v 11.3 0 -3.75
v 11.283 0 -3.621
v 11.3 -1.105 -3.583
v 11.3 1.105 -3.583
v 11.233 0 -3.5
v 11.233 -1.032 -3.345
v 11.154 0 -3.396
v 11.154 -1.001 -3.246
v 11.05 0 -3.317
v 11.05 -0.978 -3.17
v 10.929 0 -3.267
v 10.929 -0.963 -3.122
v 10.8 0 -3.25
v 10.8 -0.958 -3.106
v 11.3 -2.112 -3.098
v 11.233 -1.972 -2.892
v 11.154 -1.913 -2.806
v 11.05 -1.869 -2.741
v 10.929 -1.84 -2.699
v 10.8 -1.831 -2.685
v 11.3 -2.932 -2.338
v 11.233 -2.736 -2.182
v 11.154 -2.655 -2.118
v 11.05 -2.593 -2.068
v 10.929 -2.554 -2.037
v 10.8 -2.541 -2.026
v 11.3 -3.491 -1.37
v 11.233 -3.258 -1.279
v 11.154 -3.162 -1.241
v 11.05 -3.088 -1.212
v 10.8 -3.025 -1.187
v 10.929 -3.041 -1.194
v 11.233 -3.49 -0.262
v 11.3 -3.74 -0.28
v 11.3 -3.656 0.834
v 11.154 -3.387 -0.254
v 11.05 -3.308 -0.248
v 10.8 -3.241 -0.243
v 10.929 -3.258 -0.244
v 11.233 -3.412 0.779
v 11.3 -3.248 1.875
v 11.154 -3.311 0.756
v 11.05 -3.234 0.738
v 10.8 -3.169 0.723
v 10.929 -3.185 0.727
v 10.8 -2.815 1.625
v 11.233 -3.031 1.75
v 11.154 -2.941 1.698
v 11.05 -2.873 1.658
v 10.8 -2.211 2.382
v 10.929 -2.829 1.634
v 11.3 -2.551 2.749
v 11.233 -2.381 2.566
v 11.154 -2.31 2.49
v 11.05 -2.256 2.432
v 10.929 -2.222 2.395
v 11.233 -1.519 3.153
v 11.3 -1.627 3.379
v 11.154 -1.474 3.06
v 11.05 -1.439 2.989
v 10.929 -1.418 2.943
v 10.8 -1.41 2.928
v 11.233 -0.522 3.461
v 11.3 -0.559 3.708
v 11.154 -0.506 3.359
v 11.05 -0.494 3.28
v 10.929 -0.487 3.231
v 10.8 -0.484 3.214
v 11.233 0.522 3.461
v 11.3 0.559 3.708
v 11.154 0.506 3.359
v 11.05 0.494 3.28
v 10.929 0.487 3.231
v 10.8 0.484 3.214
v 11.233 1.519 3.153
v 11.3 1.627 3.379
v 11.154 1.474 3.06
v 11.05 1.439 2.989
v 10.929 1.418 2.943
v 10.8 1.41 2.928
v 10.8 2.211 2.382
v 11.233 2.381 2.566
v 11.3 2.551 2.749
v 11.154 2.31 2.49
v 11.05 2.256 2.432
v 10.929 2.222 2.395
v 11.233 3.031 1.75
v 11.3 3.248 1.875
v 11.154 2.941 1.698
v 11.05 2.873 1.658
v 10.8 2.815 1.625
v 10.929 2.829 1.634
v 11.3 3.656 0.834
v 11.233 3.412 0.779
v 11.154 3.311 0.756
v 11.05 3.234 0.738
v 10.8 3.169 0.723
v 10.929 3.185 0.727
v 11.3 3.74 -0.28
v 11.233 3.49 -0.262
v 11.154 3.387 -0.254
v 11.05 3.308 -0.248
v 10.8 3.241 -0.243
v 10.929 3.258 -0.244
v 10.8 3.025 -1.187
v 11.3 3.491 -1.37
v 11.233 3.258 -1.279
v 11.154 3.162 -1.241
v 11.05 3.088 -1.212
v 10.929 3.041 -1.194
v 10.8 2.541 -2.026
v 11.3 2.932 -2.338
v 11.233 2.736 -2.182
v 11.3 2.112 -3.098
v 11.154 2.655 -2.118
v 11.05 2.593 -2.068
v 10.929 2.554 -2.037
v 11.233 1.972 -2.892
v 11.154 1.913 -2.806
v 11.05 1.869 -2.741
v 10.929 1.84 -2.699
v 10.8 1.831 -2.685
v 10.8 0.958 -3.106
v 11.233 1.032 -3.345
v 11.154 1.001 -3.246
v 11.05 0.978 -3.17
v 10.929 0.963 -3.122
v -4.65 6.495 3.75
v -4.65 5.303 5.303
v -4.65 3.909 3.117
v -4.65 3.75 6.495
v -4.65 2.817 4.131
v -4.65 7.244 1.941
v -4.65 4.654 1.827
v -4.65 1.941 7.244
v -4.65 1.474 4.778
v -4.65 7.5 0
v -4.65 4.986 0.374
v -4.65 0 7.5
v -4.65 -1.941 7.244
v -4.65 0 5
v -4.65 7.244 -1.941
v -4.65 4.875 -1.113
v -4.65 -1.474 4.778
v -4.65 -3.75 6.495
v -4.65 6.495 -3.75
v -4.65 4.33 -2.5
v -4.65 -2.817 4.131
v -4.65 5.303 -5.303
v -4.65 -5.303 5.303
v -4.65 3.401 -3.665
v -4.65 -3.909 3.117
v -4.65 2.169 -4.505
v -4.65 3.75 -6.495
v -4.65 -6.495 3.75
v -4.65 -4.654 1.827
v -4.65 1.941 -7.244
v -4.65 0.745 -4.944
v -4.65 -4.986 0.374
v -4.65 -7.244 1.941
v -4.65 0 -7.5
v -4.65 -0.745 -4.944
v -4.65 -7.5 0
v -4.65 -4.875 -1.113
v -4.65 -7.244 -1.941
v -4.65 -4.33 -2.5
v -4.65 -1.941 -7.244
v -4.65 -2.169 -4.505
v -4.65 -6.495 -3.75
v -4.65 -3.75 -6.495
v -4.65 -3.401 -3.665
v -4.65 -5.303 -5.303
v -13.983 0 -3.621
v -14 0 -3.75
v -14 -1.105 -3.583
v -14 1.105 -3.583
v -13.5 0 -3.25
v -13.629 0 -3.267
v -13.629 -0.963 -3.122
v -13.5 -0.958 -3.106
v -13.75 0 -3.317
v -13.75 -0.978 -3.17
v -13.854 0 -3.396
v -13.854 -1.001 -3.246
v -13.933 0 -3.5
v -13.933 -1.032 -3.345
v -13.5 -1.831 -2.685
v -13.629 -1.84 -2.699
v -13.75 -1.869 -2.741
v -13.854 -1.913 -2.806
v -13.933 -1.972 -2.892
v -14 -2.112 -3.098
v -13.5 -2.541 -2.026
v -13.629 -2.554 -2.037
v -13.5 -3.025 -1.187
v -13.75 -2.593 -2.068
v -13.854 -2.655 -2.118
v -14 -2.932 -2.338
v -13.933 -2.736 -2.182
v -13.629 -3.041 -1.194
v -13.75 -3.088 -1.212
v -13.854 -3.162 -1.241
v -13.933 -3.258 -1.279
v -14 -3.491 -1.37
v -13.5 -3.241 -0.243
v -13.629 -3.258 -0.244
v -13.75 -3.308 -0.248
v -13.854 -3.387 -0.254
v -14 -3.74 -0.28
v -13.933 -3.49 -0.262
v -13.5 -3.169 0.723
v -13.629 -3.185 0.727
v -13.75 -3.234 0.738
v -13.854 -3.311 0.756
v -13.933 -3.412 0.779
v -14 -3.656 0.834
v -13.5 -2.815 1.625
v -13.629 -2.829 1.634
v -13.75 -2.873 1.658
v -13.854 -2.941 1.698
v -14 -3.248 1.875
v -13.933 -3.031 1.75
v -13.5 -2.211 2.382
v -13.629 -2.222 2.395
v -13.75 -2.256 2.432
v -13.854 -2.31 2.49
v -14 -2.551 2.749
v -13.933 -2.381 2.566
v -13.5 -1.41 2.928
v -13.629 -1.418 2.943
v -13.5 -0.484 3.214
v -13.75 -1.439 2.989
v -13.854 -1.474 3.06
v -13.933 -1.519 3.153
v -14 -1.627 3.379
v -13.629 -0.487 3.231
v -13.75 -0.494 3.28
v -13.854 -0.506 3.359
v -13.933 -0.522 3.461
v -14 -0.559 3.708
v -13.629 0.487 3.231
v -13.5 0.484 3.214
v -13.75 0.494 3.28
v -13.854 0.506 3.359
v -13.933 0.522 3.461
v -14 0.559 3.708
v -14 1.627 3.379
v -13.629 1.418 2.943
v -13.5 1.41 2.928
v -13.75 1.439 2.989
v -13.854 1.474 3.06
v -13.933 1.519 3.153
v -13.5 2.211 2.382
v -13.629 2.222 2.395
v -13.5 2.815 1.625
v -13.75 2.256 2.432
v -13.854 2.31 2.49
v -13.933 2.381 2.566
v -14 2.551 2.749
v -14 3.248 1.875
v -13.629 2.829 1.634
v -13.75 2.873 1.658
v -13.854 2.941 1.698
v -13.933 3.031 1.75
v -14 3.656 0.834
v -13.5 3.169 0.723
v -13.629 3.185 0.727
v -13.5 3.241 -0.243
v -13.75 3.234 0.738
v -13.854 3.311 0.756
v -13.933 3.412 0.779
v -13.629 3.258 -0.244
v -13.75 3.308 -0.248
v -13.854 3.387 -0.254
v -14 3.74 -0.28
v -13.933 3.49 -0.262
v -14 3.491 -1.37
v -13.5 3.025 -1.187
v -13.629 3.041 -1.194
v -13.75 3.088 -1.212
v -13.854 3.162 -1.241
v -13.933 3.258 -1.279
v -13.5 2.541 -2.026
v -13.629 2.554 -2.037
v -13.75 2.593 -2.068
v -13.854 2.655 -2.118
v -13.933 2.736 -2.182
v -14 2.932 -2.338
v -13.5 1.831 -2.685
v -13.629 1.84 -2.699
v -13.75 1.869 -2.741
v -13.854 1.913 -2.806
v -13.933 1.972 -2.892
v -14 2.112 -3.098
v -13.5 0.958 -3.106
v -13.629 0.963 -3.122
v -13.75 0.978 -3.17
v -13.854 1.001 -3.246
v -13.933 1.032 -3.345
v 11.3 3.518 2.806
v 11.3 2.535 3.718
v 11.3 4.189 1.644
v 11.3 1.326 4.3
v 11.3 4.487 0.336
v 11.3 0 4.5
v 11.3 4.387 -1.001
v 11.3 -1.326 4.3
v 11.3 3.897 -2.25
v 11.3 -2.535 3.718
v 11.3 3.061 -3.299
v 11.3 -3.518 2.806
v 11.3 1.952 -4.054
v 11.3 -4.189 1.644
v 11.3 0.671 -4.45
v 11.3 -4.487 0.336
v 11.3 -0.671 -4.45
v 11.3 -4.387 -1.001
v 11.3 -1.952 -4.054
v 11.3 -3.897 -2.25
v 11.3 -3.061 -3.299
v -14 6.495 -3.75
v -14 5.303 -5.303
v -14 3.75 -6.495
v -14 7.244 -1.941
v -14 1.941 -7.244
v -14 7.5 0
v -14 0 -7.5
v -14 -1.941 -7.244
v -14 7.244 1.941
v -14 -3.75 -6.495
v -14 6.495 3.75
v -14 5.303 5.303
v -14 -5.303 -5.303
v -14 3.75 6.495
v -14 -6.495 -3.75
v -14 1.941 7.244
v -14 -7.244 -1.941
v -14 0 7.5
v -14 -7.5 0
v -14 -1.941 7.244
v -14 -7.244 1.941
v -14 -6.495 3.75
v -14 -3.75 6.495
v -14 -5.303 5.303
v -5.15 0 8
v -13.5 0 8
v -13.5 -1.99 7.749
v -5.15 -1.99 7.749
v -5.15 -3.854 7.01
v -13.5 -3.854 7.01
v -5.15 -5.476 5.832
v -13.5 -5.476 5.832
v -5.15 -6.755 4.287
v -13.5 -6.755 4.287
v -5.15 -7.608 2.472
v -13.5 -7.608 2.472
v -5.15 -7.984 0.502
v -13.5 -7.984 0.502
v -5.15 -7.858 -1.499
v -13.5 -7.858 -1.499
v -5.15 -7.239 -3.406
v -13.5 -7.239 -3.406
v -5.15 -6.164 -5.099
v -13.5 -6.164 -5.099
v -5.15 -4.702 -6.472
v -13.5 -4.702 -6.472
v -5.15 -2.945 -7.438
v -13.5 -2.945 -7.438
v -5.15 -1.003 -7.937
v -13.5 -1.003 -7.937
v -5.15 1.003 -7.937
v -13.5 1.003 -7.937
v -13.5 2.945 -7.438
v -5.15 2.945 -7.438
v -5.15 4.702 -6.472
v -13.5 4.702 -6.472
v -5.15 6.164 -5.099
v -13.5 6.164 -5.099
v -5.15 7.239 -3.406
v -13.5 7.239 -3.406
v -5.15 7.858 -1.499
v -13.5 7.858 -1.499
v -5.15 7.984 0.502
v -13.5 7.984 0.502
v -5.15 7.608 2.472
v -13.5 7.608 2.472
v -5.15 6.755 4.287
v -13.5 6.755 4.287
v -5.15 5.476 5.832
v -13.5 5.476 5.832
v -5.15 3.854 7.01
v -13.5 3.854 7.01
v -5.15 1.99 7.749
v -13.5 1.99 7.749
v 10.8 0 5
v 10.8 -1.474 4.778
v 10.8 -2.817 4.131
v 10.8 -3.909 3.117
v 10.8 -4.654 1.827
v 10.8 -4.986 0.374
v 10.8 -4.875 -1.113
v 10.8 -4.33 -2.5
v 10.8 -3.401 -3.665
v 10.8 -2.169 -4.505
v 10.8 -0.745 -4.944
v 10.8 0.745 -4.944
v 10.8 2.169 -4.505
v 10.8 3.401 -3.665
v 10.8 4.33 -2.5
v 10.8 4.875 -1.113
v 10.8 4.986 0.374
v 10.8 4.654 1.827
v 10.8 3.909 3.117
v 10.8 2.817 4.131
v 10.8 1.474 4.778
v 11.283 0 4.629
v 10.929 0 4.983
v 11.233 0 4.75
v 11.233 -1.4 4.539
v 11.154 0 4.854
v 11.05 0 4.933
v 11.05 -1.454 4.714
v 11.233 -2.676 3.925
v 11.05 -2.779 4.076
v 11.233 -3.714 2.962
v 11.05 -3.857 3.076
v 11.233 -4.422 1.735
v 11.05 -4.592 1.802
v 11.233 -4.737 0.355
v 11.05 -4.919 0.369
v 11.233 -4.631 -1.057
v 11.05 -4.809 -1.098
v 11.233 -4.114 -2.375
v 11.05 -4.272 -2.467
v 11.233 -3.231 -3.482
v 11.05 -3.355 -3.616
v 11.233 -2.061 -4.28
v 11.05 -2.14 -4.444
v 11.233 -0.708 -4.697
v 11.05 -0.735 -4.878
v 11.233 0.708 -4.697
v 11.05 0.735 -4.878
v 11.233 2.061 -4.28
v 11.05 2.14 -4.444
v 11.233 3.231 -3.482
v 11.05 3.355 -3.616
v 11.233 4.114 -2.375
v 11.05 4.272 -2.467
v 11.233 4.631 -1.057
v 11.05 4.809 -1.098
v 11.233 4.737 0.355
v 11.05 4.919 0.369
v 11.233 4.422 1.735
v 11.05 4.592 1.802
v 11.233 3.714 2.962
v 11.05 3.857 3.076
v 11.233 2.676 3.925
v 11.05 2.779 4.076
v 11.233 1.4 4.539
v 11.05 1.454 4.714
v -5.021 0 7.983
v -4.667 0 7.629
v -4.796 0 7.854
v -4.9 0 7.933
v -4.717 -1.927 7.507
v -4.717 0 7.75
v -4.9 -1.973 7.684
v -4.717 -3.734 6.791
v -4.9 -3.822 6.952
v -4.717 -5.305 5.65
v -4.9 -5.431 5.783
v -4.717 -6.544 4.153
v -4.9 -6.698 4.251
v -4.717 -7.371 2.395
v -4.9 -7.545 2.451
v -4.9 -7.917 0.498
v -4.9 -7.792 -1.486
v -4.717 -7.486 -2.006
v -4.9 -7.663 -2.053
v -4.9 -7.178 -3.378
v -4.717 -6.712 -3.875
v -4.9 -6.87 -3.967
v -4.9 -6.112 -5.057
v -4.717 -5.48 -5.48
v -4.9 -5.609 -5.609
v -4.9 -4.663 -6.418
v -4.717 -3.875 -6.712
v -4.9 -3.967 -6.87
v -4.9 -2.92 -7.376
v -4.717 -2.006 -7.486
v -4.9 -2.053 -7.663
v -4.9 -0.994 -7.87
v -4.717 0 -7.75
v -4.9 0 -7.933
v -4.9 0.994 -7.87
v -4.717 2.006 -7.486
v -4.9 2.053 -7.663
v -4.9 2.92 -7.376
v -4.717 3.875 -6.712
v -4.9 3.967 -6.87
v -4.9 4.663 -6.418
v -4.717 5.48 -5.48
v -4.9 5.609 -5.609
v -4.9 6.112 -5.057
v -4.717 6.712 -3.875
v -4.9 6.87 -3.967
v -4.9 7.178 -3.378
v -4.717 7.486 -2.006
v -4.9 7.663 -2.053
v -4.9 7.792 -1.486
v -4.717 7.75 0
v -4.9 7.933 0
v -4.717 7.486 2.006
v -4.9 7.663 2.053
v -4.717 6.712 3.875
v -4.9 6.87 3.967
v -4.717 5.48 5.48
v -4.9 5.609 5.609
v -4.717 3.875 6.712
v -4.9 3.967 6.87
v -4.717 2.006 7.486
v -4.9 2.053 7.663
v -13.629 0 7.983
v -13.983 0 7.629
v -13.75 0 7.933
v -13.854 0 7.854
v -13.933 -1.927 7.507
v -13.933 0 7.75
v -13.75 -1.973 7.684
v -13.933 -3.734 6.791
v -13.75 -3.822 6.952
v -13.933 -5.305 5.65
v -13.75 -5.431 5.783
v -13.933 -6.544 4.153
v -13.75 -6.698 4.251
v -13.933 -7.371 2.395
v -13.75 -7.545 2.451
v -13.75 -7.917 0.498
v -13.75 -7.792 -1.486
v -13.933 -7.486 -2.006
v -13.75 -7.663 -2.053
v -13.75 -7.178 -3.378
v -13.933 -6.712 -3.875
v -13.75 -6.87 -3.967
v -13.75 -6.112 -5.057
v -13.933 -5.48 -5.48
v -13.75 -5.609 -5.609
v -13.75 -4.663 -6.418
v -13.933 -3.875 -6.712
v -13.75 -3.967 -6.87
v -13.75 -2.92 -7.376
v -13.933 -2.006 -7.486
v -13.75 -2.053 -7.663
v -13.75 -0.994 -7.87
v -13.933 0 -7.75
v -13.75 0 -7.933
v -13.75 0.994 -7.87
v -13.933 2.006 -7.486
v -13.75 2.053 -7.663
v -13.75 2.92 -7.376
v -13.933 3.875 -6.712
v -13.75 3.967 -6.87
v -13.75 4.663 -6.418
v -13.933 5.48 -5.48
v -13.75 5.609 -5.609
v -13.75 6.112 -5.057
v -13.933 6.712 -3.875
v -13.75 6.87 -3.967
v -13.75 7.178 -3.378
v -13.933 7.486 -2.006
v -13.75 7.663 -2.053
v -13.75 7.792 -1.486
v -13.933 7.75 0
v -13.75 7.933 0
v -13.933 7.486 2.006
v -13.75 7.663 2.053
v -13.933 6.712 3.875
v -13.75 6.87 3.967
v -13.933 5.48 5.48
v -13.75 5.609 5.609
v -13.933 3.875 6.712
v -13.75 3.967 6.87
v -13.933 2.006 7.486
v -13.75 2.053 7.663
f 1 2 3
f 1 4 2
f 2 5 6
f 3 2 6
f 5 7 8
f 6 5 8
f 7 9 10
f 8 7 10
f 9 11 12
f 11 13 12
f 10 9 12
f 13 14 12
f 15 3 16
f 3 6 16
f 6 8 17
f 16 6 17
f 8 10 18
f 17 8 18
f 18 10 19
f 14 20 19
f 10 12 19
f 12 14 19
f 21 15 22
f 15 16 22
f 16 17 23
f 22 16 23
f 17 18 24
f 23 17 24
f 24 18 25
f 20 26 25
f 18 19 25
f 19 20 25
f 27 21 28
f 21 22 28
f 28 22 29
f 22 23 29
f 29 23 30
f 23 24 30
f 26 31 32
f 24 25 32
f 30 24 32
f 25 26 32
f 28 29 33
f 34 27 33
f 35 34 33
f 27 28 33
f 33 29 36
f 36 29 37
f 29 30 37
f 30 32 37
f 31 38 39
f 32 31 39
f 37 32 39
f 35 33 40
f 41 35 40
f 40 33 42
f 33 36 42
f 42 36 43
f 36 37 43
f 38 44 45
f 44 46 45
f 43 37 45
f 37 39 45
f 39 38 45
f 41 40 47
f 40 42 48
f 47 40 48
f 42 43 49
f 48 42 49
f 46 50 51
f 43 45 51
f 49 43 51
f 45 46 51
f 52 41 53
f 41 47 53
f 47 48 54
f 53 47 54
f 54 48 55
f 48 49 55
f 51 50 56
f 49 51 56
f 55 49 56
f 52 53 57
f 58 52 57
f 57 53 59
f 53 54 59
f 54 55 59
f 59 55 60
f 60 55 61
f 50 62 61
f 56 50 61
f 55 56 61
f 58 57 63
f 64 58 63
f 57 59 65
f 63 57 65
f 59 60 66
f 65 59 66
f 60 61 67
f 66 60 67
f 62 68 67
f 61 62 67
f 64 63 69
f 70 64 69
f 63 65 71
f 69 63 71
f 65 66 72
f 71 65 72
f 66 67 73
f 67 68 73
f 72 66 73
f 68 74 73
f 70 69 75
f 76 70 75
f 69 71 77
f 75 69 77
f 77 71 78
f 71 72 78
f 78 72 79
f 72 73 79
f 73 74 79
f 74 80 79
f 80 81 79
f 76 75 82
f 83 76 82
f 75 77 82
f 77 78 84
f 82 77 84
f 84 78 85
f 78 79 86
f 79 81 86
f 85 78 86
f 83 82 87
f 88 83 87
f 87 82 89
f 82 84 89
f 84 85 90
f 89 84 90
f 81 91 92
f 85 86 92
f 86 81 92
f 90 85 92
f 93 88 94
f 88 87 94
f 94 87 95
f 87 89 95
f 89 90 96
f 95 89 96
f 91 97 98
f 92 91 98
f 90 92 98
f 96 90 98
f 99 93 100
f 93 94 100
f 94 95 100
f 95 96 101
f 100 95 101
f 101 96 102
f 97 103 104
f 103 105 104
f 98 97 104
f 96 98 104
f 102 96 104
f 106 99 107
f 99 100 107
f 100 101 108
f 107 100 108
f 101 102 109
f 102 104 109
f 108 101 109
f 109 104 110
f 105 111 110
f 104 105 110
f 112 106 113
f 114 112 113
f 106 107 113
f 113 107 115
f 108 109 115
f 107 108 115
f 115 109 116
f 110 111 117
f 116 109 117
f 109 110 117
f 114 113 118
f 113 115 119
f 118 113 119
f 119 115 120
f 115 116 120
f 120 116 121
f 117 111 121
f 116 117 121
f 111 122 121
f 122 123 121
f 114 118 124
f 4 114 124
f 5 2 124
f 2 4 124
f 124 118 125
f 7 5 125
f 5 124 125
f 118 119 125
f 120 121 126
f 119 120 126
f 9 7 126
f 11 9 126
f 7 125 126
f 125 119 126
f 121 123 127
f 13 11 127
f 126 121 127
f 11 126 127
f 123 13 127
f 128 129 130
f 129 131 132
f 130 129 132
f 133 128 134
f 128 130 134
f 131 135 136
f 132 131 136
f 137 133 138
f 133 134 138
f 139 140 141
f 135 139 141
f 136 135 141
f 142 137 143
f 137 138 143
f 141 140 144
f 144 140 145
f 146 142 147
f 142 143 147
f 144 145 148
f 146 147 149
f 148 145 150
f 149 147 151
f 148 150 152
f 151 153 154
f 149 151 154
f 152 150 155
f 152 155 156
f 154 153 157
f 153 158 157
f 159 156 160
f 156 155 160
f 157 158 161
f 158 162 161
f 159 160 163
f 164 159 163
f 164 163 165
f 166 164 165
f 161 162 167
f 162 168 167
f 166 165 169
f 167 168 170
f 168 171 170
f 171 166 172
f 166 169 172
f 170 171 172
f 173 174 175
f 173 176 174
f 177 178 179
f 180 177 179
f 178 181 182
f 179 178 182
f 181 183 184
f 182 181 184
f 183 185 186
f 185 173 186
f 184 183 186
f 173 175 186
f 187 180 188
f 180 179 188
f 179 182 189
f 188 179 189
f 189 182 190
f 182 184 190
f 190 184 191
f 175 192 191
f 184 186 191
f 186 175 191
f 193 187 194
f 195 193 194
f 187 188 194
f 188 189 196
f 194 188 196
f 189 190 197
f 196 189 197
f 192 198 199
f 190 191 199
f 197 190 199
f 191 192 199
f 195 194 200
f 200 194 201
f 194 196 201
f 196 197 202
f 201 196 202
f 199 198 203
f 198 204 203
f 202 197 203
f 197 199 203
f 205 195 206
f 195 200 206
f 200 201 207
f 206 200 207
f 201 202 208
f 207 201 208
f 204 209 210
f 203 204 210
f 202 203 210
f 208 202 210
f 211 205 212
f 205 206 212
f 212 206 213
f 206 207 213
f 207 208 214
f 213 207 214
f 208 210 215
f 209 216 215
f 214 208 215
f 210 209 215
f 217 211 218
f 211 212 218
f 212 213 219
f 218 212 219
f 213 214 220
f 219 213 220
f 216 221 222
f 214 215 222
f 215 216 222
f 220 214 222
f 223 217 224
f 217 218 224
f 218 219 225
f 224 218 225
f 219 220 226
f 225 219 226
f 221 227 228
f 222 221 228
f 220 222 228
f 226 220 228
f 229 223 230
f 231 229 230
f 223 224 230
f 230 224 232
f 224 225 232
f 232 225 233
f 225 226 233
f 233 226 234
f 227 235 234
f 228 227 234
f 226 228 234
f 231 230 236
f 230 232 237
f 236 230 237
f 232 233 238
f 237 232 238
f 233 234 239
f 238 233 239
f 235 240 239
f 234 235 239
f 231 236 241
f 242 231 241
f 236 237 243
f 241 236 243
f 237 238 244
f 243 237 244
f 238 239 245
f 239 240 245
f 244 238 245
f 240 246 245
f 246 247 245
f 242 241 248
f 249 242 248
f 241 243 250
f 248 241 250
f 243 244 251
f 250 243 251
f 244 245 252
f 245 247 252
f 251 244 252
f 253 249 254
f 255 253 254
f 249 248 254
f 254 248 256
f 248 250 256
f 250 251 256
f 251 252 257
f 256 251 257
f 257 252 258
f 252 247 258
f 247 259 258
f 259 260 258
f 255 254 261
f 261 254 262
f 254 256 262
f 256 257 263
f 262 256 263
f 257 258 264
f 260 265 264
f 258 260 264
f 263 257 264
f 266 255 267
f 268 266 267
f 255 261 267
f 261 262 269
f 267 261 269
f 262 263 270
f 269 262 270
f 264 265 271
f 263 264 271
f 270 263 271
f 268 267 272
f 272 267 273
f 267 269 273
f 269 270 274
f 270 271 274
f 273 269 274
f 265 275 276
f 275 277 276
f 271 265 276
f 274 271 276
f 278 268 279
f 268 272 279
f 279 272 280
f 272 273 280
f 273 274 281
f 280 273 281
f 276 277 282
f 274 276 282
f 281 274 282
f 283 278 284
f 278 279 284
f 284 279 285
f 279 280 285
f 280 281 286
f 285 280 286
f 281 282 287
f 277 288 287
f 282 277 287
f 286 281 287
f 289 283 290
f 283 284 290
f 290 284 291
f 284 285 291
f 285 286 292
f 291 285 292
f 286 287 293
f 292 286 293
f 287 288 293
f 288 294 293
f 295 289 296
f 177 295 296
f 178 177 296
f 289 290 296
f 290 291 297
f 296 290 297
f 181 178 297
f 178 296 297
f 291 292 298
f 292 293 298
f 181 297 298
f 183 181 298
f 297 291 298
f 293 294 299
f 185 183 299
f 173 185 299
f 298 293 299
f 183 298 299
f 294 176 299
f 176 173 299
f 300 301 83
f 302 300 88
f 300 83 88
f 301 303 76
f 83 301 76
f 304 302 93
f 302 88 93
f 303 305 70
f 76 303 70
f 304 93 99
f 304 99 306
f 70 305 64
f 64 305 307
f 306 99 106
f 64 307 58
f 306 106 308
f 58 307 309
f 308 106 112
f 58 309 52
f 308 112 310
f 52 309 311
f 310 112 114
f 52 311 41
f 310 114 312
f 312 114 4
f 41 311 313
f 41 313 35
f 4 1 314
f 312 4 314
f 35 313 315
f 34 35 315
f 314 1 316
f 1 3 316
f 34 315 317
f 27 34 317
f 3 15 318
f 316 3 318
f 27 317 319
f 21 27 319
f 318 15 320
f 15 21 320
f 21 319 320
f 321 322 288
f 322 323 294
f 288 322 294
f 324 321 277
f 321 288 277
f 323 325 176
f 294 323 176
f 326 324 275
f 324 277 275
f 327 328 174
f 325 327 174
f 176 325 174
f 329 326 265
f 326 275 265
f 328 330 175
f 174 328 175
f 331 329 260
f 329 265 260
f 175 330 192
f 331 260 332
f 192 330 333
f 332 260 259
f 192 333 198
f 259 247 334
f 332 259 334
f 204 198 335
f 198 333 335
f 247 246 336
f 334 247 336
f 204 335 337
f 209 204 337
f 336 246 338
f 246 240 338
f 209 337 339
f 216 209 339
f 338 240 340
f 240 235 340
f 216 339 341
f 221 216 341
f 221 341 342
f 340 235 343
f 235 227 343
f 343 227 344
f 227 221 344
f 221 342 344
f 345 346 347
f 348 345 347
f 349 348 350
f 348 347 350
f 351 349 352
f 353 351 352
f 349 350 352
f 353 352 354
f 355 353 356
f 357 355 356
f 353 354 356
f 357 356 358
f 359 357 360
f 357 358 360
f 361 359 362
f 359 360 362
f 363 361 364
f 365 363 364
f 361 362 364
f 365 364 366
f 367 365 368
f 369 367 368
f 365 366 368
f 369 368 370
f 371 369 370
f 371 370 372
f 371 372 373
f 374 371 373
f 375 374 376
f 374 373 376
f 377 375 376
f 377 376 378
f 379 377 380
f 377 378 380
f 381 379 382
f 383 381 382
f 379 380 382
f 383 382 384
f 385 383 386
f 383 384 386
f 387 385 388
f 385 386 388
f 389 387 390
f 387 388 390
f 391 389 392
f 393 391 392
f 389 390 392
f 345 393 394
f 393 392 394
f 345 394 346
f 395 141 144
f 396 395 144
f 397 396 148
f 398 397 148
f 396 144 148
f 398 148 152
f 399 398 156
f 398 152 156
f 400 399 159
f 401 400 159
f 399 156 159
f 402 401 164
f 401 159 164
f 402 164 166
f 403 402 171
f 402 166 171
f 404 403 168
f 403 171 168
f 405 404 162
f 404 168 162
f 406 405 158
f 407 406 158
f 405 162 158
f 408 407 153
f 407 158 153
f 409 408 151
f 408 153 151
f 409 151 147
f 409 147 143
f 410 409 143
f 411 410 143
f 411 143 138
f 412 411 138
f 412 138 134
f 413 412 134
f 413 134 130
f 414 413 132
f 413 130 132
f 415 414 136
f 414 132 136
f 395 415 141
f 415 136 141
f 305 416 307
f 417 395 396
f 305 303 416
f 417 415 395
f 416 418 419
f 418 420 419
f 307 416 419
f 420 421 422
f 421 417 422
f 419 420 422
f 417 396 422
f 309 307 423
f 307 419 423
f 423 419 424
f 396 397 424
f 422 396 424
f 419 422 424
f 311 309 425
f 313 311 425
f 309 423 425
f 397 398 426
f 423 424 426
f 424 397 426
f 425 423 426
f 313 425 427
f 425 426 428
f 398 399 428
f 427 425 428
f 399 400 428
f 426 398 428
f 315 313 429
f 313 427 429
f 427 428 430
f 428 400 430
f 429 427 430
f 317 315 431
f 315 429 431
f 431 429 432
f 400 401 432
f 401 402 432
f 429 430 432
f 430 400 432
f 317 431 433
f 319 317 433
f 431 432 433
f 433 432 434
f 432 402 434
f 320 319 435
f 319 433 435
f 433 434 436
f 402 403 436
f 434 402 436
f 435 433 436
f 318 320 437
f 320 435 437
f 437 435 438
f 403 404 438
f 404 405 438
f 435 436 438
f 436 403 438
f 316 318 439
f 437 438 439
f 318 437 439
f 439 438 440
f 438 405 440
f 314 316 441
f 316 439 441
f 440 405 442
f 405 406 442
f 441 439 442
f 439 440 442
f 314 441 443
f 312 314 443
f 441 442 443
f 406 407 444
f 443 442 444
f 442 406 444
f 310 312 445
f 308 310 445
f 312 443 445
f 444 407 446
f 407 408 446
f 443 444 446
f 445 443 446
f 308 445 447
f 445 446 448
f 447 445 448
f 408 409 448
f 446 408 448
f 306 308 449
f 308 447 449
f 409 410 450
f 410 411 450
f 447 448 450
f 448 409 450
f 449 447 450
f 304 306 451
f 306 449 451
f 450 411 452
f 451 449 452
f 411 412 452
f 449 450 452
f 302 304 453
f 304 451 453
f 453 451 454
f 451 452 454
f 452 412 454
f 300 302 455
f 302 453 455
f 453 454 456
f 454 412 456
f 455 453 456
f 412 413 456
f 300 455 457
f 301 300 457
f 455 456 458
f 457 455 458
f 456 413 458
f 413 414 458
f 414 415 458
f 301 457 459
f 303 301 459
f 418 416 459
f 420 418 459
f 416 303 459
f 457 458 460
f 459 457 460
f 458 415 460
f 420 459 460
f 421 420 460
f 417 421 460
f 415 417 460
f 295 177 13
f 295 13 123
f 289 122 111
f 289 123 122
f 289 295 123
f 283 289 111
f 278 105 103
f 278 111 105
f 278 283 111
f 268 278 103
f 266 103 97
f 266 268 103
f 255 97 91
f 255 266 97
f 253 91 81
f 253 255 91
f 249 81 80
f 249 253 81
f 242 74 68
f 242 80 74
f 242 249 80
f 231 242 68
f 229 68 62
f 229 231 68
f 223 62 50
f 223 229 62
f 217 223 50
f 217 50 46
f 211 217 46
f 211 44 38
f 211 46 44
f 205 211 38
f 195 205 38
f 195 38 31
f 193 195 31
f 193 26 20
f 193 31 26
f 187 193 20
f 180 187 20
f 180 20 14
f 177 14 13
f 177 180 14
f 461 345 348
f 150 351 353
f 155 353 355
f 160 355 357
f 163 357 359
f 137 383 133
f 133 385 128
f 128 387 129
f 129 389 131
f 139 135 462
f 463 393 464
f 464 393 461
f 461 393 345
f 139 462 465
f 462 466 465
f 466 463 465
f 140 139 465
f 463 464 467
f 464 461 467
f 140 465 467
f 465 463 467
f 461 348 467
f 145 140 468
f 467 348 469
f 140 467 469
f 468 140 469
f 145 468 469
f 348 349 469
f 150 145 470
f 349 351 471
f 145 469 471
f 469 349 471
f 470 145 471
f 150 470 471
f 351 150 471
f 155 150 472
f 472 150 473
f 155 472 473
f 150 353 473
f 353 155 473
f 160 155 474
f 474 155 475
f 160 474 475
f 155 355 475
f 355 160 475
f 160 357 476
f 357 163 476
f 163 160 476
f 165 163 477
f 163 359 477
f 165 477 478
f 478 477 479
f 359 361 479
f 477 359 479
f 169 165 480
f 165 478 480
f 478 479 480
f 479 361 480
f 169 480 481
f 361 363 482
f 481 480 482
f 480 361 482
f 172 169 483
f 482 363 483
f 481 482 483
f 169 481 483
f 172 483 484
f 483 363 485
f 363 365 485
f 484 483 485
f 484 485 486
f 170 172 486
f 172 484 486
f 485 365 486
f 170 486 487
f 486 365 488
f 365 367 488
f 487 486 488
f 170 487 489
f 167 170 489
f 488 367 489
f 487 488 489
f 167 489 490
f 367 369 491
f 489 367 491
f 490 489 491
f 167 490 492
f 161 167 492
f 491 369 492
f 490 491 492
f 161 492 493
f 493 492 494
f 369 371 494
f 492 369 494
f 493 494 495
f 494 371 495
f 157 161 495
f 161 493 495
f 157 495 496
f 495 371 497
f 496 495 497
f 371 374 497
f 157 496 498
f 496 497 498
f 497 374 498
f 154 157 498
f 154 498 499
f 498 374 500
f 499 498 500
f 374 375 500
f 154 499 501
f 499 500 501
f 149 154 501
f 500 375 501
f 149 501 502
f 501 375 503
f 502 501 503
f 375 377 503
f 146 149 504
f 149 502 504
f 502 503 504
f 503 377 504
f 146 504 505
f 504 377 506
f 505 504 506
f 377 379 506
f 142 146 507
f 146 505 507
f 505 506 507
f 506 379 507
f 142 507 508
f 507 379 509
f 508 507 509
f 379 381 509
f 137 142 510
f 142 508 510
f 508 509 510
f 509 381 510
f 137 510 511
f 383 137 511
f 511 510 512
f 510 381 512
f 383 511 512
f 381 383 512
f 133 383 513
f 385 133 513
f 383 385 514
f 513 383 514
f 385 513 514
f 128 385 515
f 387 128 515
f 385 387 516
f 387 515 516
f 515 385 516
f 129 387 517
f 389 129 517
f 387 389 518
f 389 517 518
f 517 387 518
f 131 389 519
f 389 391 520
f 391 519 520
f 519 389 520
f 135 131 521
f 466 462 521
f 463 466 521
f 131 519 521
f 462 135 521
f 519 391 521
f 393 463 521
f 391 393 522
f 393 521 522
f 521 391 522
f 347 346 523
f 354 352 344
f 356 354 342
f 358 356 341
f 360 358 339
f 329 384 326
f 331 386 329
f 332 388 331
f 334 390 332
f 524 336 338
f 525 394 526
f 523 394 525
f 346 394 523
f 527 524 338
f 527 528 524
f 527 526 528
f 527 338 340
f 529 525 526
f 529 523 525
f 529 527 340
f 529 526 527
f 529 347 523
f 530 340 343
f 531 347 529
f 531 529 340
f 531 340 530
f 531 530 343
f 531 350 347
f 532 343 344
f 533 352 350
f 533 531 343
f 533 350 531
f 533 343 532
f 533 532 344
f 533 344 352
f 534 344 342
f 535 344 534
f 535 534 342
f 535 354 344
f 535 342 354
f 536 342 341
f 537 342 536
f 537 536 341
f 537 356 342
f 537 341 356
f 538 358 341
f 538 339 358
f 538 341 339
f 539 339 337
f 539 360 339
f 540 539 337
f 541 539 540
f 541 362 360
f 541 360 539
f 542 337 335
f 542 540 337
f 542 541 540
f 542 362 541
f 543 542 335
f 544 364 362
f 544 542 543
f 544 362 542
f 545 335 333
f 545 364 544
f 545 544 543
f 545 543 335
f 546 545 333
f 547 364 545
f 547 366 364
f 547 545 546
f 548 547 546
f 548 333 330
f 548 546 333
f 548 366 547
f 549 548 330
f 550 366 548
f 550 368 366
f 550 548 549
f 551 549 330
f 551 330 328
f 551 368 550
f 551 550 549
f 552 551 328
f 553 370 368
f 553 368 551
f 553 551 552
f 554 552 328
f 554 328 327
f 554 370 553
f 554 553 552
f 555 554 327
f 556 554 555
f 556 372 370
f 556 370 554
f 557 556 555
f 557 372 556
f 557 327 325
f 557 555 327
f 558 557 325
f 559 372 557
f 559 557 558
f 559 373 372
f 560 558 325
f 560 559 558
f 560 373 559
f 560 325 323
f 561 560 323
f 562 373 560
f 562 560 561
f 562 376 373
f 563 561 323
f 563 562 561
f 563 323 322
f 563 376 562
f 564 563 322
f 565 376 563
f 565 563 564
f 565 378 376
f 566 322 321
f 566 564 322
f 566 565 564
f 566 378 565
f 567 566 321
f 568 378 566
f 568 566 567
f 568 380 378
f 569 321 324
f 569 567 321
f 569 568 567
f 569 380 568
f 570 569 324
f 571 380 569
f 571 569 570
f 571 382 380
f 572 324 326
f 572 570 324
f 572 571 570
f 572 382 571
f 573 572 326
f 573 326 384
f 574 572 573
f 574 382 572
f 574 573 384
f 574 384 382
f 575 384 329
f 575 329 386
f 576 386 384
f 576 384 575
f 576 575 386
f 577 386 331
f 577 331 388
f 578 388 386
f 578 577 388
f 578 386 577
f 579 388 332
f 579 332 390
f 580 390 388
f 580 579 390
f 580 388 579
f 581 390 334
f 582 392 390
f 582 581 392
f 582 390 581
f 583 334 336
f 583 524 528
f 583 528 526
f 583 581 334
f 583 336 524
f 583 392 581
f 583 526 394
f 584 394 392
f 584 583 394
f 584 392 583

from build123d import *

# Parameters (mm, degrees)
CUT_EXTRUDE1_DEPTH      = 19
CUT_EXTRUDE1_DEPTH_BACK = 19
SKETCH2_R               = 3.25
FILLET1_R               = 0.5


with BuildPart() as part:
    # Sketch1 → Revolve1 (revolve)
    with BuildSketch(Plane.XY, mode=Mode.PRIVATE) as revolve1_sk:
        Polygon((-14, 0), (11.3, 0), (11.3, 5), (-4.65, 5), (-4.65, 8), (-14, 8), align=None)
    revolve(revolve1_sk.sketch.rotate(Axis((-1.174323487, 0, 0), (1, 0, 0)), 90), axis=Axis((-1.174323487, 0, 0), (1, 0, 0)))

    # Sketch2 → Cut-Extrude1 (cut, two sides: drawn at the far end of the back side and taken through both)
    with BuildSketch(Plane(origin=(0, 0, 0), x_dir=(0, 0, -1), z_dir=(1, 0, 0)).offset(-CUT_EXTRUDE1_DEPTH_BACK)):
        Circle(SKETCH2_R)
    extrude(amount=CUT_EXTRUDE1_DEPTH + CUT_EXTRUDE1_DEPTH_BACK, mode=Mode.SUBTRACT)

    # Fillet1
    fillet1_edges = [part.edges().sort_by_distance(p)[0] for p in [
        (-14, 0, 3.25),
        (11.3, 0, 3.25),
        (-14, 0, -8),
        (-4.65, 0, -8),
        (11.3, 0, -5),
    ]]
    fillet(fillet1_edges, radius=FILLET1_R)


solid = part.part
